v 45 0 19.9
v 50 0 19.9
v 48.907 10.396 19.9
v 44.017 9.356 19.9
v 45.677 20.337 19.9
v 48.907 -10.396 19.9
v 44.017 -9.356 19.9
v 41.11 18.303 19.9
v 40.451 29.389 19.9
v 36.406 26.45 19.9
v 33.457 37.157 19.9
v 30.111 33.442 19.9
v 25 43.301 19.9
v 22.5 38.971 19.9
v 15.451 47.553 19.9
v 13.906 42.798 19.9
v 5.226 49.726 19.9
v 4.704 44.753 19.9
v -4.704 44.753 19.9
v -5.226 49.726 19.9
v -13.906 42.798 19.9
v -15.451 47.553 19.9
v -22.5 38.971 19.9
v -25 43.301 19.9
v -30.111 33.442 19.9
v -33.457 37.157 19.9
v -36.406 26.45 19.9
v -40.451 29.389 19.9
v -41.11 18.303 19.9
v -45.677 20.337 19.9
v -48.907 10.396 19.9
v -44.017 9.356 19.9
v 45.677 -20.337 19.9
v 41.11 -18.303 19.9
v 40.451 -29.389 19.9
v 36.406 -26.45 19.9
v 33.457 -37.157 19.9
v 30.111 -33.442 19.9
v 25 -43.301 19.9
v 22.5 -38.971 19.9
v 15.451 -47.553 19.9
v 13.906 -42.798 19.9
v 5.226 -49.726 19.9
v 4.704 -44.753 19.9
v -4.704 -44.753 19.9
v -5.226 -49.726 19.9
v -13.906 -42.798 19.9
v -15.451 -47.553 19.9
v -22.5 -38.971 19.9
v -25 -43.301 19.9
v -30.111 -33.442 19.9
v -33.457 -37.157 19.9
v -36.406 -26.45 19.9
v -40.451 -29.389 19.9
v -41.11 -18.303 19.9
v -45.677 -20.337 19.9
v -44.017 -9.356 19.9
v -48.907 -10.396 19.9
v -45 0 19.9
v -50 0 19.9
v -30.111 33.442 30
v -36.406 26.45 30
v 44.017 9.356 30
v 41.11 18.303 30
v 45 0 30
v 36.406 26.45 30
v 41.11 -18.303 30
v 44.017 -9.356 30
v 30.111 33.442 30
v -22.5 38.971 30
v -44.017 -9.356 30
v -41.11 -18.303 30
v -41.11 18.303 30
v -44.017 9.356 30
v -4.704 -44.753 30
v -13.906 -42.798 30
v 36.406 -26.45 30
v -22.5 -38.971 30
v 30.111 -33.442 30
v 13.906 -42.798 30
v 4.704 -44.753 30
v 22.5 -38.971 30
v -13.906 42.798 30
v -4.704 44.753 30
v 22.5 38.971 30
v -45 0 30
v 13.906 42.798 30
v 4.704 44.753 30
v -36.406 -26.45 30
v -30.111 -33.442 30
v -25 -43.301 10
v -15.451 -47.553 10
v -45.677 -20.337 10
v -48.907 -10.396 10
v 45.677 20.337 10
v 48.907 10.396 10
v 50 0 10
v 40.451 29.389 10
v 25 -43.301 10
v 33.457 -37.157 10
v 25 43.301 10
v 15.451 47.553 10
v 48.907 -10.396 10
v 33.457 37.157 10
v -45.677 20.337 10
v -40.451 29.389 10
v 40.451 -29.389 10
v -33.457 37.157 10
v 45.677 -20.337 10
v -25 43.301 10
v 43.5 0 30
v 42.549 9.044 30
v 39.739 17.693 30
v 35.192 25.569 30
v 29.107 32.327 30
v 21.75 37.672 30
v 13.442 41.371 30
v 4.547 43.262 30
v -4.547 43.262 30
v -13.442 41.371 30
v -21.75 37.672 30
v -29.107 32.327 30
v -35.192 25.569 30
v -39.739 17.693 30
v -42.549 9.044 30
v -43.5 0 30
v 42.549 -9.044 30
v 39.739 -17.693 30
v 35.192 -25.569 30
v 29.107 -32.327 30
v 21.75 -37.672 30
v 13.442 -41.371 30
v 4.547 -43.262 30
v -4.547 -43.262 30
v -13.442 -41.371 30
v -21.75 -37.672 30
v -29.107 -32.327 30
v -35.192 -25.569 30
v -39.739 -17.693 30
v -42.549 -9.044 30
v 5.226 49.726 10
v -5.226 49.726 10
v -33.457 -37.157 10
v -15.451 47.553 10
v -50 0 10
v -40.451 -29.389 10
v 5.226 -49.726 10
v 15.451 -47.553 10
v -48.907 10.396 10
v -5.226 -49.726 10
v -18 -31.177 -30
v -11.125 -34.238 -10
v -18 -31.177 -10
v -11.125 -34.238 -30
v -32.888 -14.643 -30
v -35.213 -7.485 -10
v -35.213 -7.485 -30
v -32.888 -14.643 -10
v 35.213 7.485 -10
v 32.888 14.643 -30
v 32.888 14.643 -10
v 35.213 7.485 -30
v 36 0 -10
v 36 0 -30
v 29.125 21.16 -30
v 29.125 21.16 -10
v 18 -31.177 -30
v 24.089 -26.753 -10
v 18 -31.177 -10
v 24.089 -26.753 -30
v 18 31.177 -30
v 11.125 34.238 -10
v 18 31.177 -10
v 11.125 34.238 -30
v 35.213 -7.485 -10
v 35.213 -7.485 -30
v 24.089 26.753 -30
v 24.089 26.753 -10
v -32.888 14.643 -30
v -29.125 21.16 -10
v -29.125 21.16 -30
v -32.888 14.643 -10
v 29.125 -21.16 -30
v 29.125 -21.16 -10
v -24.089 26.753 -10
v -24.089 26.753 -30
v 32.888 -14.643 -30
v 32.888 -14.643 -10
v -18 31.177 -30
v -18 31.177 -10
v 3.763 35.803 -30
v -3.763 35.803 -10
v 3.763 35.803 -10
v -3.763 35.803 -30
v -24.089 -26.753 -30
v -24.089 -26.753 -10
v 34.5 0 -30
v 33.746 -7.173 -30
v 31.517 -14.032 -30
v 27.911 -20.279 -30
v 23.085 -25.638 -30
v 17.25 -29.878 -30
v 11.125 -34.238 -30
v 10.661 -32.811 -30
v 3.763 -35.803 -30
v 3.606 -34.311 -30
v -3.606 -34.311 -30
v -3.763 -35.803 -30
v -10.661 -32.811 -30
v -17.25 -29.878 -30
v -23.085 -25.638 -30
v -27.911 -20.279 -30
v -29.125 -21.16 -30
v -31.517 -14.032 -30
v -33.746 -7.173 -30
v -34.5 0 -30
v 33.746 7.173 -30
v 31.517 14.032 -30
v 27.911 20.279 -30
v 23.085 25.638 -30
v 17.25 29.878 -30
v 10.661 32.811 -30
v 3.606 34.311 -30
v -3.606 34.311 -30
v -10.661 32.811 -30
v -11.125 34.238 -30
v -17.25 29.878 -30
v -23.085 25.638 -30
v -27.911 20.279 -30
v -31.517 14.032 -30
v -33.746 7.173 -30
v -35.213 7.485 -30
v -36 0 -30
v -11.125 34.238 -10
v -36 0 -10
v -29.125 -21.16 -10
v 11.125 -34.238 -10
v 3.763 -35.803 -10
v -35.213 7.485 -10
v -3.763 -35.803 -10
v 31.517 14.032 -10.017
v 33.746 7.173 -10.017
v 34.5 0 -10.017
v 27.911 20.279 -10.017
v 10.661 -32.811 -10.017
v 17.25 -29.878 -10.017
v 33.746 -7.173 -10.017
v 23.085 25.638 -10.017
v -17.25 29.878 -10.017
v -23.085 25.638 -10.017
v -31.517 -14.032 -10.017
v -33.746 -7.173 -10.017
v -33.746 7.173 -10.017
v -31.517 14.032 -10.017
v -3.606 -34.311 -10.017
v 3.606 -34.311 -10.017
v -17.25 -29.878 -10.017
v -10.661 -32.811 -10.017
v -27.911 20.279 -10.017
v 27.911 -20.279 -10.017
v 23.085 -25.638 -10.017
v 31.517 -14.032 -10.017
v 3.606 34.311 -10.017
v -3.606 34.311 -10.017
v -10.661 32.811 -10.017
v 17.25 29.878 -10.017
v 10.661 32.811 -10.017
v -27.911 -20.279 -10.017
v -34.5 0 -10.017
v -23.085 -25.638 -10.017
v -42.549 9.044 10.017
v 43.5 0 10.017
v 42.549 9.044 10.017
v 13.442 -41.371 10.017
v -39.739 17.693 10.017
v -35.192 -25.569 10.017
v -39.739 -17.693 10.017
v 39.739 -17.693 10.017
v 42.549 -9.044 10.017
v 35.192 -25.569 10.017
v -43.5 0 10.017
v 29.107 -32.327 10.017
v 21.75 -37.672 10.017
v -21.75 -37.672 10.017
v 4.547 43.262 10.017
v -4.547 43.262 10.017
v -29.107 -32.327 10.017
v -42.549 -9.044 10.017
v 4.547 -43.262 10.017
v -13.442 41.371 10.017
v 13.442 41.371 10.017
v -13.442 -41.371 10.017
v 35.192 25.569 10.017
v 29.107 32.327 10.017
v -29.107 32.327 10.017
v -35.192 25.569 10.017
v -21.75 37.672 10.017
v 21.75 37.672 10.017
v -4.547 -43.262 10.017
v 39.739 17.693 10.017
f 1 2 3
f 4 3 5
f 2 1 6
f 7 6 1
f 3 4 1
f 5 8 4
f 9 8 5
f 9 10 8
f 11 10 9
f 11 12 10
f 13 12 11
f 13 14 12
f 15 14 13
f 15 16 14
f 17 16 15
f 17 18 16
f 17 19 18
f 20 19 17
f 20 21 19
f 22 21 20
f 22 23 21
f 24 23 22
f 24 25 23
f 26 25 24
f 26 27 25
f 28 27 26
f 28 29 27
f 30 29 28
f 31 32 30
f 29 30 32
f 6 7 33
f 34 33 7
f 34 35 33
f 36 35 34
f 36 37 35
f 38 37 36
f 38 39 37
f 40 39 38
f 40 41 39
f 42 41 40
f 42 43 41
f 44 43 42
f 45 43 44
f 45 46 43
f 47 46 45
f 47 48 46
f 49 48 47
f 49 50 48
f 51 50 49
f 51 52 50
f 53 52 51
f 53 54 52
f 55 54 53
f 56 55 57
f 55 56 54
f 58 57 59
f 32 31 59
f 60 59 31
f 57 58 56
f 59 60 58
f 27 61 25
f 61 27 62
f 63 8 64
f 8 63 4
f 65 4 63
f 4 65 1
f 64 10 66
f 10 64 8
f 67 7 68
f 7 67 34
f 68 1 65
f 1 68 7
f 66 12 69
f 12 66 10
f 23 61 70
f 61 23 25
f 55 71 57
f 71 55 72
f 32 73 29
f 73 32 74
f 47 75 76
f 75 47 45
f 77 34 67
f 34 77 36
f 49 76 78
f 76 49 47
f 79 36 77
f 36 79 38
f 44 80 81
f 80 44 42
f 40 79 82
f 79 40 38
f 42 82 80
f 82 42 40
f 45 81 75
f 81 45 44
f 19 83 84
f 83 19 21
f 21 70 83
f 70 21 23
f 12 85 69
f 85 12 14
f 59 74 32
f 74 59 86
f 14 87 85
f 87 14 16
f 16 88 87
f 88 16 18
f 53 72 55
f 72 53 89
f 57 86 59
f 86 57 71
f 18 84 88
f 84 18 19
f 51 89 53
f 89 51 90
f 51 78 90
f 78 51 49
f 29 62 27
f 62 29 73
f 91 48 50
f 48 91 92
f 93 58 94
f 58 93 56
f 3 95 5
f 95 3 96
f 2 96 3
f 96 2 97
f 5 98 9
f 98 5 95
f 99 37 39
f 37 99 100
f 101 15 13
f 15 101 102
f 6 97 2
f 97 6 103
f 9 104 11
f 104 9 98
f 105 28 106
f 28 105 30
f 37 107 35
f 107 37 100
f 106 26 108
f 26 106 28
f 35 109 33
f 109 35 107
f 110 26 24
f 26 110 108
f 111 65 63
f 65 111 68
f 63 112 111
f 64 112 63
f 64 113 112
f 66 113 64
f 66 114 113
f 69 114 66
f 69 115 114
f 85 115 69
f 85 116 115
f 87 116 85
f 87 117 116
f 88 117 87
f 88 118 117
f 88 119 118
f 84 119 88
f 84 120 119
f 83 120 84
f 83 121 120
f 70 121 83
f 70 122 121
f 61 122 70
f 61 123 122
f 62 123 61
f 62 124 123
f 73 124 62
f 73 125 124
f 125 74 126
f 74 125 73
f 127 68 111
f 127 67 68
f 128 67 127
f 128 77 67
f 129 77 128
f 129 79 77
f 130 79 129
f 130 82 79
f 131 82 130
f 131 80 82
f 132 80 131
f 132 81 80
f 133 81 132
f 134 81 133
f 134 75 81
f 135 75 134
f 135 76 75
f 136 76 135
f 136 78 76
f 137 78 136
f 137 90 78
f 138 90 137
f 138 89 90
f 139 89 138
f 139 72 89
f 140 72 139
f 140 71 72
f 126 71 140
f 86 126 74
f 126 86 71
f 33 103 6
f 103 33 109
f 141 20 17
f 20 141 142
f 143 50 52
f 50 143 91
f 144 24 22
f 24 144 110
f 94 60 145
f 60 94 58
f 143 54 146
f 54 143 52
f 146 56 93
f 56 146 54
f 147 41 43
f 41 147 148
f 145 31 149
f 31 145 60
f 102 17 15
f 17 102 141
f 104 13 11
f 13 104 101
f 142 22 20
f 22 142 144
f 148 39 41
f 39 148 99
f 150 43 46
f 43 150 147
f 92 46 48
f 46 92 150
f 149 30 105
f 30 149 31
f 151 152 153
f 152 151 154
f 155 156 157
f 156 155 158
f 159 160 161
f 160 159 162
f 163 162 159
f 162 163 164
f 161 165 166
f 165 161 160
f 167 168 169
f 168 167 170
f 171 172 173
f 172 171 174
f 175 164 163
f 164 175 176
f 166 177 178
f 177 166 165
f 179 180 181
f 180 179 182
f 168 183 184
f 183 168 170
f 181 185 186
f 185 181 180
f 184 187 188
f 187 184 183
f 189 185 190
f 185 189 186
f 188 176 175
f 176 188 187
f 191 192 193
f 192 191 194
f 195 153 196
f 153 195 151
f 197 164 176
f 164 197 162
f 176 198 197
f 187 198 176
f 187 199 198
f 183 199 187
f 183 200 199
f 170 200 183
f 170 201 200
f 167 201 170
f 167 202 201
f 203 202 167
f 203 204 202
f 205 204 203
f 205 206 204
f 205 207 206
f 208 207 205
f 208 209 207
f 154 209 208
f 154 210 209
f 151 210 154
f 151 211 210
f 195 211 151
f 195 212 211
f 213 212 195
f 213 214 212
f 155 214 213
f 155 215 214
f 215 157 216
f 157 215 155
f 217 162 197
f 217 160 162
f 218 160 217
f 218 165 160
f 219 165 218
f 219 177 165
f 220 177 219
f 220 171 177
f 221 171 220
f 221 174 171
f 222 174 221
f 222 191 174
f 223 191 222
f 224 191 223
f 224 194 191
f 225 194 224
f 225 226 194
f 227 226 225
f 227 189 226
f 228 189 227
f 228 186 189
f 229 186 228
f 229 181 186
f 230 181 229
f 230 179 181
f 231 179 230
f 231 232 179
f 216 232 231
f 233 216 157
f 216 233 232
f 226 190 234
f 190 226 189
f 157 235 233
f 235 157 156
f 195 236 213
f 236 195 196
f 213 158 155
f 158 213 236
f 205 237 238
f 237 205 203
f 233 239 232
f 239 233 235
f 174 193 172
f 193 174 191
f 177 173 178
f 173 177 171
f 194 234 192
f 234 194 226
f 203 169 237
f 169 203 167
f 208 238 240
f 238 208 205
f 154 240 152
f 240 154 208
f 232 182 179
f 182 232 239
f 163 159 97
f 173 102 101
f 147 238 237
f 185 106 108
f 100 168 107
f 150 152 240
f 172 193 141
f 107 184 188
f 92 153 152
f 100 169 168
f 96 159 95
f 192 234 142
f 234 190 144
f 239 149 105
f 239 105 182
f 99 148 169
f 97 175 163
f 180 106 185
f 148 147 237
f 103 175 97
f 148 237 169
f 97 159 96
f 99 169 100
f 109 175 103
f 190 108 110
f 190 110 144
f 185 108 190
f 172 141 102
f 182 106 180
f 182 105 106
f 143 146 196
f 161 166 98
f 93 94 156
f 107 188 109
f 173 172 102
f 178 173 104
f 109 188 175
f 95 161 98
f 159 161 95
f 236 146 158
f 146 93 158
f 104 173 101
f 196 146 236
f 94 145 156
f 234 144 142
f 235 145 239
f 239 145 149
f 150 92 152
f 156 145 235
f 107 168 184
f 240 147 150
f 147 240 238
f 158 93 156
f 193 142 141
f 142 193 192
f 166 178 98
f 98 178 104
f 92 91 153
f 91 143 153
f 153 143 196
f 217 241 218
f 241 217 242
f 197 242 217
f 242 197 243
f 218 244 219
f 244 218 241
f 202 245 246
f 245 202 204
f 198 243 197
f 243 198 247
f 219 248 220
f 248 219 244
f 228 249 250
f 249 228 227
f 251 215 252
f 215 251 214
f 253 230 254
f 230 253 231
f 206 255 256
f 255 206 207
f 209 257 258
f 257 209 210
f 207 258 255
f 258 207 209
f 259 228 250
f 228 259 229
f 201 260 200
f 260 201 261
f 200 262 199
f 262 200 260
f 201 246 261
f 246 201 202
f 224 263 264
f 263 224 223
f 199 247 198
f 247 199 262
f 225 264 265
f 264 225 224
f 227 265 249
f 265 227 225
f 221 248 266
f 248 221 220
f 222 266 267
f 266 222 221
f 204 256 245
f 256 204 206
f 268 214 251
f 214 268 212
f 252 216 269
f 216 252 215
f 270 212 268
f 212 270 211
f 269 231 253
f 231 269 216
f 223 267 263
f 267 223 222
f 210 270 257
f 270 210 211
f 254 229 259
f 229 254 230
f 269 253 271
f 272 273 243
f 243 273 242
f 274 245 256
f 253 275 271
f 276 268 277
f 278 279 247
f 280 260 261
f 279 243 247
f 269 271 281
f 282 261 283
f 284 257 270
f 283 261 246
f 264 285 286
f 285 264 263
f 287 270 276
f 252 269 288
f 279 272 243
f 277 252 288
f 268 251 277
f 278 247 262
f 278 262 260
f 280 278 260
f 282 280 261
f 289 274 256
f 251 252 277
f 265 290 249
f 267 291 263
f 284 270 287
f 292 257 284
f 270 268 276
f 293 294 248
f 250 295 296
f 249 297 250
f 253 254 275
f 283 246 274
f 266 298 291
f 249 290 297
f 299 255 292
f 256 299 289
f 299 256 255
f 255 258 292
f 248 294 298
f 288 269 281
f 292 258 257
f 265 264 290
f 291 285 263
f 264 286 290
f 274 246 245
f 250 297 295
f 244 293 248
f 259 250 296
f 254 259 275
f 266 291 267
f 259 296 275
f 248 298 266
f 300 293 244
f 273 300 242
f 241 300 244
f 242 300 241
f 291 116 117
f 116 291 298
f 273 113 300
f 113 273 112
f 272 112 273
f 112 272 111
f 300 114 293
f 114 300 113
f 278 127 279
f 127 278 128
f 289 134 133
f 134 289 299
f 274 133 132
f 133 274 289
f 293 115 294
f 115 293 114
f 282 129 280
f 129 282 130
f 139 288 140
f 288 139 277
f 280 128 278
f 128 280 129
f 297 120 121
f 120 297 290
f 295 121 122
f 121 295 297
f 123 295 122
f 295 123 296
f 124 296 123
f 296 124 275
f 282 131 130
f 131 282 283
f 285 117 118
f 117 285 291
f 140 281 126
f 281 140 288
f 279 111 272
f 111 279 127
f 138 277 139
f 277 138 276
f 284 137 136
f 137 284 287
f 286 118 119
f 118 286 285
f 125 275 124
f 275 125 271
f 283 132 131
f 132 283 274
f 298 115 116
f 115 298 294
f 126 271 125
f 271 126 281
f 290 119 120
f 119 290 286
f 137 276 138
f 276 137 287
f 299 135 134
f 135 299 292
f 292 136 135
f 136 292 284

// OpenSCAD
// This file is licensed under CC0 1.0 Universal.
// See https://creativecommons.org/publicdomain/zero/1.0/
schlauch_durchmesser                  = 75;
schlauch_wand_staerke                 = 1.5;

schlauch_anschluss_durchmesser        = 90;
schlauch_anschluss_durchmesser_aussen = 100;
wand_staerke                          = 1.5;

hoehe                                 = 60;

difference() {
    body(
        schlauch_durchmesser - schlauch_wand_staerke * 2,
        schlauch_anschluss_durchmesser,
        schlauch_anschluss_durchmesser_aussen,
        hoehe
    );
    body(
        schlauch_durchmesser - schlauch_wand_staerke * 2 - wand_staerke * 2,
        schlauch_anschluss_durchmesser - wand_staerke * 2,
        schlauch_anschluss_durchmesser - wand_staerke * 2,
        hoehe + 0.1
    );
}

module body(von_durchmesser = 10, auf_durchmesser_innen = 20, auf_durchmesser_aussen = 30, gesamt_hoehe = 30) {
    union() {
        translate([0, 0, gesamt_hoehe / -3]) {
            cylinder(d = von_durchmesser, h = gesamt_hoehe / 3, center = true);
        }
        cylinder(d1 = von_durchmesser, d2 = auf_durchmesser_aussen, h = gesamt_hoehe / 3, center = true);
        translate([0, 0, gesamt_hoehe / 3]) {
            difference() {
                cylinder(d = auf_durchmesser_aussen, h = gesamt_hoehe / 3, center = true);
                if (auf_durchmesser_innen < auf_durchmesser_aussen) {
                    translate([0, 0, gesamt_hoehe / 12]) {
                        difference() {
                            cylinder(d = auf_durchmesser_aussen + 0.2, h = gesamt_hoehe / 6 + 0.2, center = true);
                            cylinder(d = auf_durchmesser_innen, h = gesamt_hoehe / 6 + 0.2, center = true);
                        }
                    }
                }
            }
        }
    }
}
